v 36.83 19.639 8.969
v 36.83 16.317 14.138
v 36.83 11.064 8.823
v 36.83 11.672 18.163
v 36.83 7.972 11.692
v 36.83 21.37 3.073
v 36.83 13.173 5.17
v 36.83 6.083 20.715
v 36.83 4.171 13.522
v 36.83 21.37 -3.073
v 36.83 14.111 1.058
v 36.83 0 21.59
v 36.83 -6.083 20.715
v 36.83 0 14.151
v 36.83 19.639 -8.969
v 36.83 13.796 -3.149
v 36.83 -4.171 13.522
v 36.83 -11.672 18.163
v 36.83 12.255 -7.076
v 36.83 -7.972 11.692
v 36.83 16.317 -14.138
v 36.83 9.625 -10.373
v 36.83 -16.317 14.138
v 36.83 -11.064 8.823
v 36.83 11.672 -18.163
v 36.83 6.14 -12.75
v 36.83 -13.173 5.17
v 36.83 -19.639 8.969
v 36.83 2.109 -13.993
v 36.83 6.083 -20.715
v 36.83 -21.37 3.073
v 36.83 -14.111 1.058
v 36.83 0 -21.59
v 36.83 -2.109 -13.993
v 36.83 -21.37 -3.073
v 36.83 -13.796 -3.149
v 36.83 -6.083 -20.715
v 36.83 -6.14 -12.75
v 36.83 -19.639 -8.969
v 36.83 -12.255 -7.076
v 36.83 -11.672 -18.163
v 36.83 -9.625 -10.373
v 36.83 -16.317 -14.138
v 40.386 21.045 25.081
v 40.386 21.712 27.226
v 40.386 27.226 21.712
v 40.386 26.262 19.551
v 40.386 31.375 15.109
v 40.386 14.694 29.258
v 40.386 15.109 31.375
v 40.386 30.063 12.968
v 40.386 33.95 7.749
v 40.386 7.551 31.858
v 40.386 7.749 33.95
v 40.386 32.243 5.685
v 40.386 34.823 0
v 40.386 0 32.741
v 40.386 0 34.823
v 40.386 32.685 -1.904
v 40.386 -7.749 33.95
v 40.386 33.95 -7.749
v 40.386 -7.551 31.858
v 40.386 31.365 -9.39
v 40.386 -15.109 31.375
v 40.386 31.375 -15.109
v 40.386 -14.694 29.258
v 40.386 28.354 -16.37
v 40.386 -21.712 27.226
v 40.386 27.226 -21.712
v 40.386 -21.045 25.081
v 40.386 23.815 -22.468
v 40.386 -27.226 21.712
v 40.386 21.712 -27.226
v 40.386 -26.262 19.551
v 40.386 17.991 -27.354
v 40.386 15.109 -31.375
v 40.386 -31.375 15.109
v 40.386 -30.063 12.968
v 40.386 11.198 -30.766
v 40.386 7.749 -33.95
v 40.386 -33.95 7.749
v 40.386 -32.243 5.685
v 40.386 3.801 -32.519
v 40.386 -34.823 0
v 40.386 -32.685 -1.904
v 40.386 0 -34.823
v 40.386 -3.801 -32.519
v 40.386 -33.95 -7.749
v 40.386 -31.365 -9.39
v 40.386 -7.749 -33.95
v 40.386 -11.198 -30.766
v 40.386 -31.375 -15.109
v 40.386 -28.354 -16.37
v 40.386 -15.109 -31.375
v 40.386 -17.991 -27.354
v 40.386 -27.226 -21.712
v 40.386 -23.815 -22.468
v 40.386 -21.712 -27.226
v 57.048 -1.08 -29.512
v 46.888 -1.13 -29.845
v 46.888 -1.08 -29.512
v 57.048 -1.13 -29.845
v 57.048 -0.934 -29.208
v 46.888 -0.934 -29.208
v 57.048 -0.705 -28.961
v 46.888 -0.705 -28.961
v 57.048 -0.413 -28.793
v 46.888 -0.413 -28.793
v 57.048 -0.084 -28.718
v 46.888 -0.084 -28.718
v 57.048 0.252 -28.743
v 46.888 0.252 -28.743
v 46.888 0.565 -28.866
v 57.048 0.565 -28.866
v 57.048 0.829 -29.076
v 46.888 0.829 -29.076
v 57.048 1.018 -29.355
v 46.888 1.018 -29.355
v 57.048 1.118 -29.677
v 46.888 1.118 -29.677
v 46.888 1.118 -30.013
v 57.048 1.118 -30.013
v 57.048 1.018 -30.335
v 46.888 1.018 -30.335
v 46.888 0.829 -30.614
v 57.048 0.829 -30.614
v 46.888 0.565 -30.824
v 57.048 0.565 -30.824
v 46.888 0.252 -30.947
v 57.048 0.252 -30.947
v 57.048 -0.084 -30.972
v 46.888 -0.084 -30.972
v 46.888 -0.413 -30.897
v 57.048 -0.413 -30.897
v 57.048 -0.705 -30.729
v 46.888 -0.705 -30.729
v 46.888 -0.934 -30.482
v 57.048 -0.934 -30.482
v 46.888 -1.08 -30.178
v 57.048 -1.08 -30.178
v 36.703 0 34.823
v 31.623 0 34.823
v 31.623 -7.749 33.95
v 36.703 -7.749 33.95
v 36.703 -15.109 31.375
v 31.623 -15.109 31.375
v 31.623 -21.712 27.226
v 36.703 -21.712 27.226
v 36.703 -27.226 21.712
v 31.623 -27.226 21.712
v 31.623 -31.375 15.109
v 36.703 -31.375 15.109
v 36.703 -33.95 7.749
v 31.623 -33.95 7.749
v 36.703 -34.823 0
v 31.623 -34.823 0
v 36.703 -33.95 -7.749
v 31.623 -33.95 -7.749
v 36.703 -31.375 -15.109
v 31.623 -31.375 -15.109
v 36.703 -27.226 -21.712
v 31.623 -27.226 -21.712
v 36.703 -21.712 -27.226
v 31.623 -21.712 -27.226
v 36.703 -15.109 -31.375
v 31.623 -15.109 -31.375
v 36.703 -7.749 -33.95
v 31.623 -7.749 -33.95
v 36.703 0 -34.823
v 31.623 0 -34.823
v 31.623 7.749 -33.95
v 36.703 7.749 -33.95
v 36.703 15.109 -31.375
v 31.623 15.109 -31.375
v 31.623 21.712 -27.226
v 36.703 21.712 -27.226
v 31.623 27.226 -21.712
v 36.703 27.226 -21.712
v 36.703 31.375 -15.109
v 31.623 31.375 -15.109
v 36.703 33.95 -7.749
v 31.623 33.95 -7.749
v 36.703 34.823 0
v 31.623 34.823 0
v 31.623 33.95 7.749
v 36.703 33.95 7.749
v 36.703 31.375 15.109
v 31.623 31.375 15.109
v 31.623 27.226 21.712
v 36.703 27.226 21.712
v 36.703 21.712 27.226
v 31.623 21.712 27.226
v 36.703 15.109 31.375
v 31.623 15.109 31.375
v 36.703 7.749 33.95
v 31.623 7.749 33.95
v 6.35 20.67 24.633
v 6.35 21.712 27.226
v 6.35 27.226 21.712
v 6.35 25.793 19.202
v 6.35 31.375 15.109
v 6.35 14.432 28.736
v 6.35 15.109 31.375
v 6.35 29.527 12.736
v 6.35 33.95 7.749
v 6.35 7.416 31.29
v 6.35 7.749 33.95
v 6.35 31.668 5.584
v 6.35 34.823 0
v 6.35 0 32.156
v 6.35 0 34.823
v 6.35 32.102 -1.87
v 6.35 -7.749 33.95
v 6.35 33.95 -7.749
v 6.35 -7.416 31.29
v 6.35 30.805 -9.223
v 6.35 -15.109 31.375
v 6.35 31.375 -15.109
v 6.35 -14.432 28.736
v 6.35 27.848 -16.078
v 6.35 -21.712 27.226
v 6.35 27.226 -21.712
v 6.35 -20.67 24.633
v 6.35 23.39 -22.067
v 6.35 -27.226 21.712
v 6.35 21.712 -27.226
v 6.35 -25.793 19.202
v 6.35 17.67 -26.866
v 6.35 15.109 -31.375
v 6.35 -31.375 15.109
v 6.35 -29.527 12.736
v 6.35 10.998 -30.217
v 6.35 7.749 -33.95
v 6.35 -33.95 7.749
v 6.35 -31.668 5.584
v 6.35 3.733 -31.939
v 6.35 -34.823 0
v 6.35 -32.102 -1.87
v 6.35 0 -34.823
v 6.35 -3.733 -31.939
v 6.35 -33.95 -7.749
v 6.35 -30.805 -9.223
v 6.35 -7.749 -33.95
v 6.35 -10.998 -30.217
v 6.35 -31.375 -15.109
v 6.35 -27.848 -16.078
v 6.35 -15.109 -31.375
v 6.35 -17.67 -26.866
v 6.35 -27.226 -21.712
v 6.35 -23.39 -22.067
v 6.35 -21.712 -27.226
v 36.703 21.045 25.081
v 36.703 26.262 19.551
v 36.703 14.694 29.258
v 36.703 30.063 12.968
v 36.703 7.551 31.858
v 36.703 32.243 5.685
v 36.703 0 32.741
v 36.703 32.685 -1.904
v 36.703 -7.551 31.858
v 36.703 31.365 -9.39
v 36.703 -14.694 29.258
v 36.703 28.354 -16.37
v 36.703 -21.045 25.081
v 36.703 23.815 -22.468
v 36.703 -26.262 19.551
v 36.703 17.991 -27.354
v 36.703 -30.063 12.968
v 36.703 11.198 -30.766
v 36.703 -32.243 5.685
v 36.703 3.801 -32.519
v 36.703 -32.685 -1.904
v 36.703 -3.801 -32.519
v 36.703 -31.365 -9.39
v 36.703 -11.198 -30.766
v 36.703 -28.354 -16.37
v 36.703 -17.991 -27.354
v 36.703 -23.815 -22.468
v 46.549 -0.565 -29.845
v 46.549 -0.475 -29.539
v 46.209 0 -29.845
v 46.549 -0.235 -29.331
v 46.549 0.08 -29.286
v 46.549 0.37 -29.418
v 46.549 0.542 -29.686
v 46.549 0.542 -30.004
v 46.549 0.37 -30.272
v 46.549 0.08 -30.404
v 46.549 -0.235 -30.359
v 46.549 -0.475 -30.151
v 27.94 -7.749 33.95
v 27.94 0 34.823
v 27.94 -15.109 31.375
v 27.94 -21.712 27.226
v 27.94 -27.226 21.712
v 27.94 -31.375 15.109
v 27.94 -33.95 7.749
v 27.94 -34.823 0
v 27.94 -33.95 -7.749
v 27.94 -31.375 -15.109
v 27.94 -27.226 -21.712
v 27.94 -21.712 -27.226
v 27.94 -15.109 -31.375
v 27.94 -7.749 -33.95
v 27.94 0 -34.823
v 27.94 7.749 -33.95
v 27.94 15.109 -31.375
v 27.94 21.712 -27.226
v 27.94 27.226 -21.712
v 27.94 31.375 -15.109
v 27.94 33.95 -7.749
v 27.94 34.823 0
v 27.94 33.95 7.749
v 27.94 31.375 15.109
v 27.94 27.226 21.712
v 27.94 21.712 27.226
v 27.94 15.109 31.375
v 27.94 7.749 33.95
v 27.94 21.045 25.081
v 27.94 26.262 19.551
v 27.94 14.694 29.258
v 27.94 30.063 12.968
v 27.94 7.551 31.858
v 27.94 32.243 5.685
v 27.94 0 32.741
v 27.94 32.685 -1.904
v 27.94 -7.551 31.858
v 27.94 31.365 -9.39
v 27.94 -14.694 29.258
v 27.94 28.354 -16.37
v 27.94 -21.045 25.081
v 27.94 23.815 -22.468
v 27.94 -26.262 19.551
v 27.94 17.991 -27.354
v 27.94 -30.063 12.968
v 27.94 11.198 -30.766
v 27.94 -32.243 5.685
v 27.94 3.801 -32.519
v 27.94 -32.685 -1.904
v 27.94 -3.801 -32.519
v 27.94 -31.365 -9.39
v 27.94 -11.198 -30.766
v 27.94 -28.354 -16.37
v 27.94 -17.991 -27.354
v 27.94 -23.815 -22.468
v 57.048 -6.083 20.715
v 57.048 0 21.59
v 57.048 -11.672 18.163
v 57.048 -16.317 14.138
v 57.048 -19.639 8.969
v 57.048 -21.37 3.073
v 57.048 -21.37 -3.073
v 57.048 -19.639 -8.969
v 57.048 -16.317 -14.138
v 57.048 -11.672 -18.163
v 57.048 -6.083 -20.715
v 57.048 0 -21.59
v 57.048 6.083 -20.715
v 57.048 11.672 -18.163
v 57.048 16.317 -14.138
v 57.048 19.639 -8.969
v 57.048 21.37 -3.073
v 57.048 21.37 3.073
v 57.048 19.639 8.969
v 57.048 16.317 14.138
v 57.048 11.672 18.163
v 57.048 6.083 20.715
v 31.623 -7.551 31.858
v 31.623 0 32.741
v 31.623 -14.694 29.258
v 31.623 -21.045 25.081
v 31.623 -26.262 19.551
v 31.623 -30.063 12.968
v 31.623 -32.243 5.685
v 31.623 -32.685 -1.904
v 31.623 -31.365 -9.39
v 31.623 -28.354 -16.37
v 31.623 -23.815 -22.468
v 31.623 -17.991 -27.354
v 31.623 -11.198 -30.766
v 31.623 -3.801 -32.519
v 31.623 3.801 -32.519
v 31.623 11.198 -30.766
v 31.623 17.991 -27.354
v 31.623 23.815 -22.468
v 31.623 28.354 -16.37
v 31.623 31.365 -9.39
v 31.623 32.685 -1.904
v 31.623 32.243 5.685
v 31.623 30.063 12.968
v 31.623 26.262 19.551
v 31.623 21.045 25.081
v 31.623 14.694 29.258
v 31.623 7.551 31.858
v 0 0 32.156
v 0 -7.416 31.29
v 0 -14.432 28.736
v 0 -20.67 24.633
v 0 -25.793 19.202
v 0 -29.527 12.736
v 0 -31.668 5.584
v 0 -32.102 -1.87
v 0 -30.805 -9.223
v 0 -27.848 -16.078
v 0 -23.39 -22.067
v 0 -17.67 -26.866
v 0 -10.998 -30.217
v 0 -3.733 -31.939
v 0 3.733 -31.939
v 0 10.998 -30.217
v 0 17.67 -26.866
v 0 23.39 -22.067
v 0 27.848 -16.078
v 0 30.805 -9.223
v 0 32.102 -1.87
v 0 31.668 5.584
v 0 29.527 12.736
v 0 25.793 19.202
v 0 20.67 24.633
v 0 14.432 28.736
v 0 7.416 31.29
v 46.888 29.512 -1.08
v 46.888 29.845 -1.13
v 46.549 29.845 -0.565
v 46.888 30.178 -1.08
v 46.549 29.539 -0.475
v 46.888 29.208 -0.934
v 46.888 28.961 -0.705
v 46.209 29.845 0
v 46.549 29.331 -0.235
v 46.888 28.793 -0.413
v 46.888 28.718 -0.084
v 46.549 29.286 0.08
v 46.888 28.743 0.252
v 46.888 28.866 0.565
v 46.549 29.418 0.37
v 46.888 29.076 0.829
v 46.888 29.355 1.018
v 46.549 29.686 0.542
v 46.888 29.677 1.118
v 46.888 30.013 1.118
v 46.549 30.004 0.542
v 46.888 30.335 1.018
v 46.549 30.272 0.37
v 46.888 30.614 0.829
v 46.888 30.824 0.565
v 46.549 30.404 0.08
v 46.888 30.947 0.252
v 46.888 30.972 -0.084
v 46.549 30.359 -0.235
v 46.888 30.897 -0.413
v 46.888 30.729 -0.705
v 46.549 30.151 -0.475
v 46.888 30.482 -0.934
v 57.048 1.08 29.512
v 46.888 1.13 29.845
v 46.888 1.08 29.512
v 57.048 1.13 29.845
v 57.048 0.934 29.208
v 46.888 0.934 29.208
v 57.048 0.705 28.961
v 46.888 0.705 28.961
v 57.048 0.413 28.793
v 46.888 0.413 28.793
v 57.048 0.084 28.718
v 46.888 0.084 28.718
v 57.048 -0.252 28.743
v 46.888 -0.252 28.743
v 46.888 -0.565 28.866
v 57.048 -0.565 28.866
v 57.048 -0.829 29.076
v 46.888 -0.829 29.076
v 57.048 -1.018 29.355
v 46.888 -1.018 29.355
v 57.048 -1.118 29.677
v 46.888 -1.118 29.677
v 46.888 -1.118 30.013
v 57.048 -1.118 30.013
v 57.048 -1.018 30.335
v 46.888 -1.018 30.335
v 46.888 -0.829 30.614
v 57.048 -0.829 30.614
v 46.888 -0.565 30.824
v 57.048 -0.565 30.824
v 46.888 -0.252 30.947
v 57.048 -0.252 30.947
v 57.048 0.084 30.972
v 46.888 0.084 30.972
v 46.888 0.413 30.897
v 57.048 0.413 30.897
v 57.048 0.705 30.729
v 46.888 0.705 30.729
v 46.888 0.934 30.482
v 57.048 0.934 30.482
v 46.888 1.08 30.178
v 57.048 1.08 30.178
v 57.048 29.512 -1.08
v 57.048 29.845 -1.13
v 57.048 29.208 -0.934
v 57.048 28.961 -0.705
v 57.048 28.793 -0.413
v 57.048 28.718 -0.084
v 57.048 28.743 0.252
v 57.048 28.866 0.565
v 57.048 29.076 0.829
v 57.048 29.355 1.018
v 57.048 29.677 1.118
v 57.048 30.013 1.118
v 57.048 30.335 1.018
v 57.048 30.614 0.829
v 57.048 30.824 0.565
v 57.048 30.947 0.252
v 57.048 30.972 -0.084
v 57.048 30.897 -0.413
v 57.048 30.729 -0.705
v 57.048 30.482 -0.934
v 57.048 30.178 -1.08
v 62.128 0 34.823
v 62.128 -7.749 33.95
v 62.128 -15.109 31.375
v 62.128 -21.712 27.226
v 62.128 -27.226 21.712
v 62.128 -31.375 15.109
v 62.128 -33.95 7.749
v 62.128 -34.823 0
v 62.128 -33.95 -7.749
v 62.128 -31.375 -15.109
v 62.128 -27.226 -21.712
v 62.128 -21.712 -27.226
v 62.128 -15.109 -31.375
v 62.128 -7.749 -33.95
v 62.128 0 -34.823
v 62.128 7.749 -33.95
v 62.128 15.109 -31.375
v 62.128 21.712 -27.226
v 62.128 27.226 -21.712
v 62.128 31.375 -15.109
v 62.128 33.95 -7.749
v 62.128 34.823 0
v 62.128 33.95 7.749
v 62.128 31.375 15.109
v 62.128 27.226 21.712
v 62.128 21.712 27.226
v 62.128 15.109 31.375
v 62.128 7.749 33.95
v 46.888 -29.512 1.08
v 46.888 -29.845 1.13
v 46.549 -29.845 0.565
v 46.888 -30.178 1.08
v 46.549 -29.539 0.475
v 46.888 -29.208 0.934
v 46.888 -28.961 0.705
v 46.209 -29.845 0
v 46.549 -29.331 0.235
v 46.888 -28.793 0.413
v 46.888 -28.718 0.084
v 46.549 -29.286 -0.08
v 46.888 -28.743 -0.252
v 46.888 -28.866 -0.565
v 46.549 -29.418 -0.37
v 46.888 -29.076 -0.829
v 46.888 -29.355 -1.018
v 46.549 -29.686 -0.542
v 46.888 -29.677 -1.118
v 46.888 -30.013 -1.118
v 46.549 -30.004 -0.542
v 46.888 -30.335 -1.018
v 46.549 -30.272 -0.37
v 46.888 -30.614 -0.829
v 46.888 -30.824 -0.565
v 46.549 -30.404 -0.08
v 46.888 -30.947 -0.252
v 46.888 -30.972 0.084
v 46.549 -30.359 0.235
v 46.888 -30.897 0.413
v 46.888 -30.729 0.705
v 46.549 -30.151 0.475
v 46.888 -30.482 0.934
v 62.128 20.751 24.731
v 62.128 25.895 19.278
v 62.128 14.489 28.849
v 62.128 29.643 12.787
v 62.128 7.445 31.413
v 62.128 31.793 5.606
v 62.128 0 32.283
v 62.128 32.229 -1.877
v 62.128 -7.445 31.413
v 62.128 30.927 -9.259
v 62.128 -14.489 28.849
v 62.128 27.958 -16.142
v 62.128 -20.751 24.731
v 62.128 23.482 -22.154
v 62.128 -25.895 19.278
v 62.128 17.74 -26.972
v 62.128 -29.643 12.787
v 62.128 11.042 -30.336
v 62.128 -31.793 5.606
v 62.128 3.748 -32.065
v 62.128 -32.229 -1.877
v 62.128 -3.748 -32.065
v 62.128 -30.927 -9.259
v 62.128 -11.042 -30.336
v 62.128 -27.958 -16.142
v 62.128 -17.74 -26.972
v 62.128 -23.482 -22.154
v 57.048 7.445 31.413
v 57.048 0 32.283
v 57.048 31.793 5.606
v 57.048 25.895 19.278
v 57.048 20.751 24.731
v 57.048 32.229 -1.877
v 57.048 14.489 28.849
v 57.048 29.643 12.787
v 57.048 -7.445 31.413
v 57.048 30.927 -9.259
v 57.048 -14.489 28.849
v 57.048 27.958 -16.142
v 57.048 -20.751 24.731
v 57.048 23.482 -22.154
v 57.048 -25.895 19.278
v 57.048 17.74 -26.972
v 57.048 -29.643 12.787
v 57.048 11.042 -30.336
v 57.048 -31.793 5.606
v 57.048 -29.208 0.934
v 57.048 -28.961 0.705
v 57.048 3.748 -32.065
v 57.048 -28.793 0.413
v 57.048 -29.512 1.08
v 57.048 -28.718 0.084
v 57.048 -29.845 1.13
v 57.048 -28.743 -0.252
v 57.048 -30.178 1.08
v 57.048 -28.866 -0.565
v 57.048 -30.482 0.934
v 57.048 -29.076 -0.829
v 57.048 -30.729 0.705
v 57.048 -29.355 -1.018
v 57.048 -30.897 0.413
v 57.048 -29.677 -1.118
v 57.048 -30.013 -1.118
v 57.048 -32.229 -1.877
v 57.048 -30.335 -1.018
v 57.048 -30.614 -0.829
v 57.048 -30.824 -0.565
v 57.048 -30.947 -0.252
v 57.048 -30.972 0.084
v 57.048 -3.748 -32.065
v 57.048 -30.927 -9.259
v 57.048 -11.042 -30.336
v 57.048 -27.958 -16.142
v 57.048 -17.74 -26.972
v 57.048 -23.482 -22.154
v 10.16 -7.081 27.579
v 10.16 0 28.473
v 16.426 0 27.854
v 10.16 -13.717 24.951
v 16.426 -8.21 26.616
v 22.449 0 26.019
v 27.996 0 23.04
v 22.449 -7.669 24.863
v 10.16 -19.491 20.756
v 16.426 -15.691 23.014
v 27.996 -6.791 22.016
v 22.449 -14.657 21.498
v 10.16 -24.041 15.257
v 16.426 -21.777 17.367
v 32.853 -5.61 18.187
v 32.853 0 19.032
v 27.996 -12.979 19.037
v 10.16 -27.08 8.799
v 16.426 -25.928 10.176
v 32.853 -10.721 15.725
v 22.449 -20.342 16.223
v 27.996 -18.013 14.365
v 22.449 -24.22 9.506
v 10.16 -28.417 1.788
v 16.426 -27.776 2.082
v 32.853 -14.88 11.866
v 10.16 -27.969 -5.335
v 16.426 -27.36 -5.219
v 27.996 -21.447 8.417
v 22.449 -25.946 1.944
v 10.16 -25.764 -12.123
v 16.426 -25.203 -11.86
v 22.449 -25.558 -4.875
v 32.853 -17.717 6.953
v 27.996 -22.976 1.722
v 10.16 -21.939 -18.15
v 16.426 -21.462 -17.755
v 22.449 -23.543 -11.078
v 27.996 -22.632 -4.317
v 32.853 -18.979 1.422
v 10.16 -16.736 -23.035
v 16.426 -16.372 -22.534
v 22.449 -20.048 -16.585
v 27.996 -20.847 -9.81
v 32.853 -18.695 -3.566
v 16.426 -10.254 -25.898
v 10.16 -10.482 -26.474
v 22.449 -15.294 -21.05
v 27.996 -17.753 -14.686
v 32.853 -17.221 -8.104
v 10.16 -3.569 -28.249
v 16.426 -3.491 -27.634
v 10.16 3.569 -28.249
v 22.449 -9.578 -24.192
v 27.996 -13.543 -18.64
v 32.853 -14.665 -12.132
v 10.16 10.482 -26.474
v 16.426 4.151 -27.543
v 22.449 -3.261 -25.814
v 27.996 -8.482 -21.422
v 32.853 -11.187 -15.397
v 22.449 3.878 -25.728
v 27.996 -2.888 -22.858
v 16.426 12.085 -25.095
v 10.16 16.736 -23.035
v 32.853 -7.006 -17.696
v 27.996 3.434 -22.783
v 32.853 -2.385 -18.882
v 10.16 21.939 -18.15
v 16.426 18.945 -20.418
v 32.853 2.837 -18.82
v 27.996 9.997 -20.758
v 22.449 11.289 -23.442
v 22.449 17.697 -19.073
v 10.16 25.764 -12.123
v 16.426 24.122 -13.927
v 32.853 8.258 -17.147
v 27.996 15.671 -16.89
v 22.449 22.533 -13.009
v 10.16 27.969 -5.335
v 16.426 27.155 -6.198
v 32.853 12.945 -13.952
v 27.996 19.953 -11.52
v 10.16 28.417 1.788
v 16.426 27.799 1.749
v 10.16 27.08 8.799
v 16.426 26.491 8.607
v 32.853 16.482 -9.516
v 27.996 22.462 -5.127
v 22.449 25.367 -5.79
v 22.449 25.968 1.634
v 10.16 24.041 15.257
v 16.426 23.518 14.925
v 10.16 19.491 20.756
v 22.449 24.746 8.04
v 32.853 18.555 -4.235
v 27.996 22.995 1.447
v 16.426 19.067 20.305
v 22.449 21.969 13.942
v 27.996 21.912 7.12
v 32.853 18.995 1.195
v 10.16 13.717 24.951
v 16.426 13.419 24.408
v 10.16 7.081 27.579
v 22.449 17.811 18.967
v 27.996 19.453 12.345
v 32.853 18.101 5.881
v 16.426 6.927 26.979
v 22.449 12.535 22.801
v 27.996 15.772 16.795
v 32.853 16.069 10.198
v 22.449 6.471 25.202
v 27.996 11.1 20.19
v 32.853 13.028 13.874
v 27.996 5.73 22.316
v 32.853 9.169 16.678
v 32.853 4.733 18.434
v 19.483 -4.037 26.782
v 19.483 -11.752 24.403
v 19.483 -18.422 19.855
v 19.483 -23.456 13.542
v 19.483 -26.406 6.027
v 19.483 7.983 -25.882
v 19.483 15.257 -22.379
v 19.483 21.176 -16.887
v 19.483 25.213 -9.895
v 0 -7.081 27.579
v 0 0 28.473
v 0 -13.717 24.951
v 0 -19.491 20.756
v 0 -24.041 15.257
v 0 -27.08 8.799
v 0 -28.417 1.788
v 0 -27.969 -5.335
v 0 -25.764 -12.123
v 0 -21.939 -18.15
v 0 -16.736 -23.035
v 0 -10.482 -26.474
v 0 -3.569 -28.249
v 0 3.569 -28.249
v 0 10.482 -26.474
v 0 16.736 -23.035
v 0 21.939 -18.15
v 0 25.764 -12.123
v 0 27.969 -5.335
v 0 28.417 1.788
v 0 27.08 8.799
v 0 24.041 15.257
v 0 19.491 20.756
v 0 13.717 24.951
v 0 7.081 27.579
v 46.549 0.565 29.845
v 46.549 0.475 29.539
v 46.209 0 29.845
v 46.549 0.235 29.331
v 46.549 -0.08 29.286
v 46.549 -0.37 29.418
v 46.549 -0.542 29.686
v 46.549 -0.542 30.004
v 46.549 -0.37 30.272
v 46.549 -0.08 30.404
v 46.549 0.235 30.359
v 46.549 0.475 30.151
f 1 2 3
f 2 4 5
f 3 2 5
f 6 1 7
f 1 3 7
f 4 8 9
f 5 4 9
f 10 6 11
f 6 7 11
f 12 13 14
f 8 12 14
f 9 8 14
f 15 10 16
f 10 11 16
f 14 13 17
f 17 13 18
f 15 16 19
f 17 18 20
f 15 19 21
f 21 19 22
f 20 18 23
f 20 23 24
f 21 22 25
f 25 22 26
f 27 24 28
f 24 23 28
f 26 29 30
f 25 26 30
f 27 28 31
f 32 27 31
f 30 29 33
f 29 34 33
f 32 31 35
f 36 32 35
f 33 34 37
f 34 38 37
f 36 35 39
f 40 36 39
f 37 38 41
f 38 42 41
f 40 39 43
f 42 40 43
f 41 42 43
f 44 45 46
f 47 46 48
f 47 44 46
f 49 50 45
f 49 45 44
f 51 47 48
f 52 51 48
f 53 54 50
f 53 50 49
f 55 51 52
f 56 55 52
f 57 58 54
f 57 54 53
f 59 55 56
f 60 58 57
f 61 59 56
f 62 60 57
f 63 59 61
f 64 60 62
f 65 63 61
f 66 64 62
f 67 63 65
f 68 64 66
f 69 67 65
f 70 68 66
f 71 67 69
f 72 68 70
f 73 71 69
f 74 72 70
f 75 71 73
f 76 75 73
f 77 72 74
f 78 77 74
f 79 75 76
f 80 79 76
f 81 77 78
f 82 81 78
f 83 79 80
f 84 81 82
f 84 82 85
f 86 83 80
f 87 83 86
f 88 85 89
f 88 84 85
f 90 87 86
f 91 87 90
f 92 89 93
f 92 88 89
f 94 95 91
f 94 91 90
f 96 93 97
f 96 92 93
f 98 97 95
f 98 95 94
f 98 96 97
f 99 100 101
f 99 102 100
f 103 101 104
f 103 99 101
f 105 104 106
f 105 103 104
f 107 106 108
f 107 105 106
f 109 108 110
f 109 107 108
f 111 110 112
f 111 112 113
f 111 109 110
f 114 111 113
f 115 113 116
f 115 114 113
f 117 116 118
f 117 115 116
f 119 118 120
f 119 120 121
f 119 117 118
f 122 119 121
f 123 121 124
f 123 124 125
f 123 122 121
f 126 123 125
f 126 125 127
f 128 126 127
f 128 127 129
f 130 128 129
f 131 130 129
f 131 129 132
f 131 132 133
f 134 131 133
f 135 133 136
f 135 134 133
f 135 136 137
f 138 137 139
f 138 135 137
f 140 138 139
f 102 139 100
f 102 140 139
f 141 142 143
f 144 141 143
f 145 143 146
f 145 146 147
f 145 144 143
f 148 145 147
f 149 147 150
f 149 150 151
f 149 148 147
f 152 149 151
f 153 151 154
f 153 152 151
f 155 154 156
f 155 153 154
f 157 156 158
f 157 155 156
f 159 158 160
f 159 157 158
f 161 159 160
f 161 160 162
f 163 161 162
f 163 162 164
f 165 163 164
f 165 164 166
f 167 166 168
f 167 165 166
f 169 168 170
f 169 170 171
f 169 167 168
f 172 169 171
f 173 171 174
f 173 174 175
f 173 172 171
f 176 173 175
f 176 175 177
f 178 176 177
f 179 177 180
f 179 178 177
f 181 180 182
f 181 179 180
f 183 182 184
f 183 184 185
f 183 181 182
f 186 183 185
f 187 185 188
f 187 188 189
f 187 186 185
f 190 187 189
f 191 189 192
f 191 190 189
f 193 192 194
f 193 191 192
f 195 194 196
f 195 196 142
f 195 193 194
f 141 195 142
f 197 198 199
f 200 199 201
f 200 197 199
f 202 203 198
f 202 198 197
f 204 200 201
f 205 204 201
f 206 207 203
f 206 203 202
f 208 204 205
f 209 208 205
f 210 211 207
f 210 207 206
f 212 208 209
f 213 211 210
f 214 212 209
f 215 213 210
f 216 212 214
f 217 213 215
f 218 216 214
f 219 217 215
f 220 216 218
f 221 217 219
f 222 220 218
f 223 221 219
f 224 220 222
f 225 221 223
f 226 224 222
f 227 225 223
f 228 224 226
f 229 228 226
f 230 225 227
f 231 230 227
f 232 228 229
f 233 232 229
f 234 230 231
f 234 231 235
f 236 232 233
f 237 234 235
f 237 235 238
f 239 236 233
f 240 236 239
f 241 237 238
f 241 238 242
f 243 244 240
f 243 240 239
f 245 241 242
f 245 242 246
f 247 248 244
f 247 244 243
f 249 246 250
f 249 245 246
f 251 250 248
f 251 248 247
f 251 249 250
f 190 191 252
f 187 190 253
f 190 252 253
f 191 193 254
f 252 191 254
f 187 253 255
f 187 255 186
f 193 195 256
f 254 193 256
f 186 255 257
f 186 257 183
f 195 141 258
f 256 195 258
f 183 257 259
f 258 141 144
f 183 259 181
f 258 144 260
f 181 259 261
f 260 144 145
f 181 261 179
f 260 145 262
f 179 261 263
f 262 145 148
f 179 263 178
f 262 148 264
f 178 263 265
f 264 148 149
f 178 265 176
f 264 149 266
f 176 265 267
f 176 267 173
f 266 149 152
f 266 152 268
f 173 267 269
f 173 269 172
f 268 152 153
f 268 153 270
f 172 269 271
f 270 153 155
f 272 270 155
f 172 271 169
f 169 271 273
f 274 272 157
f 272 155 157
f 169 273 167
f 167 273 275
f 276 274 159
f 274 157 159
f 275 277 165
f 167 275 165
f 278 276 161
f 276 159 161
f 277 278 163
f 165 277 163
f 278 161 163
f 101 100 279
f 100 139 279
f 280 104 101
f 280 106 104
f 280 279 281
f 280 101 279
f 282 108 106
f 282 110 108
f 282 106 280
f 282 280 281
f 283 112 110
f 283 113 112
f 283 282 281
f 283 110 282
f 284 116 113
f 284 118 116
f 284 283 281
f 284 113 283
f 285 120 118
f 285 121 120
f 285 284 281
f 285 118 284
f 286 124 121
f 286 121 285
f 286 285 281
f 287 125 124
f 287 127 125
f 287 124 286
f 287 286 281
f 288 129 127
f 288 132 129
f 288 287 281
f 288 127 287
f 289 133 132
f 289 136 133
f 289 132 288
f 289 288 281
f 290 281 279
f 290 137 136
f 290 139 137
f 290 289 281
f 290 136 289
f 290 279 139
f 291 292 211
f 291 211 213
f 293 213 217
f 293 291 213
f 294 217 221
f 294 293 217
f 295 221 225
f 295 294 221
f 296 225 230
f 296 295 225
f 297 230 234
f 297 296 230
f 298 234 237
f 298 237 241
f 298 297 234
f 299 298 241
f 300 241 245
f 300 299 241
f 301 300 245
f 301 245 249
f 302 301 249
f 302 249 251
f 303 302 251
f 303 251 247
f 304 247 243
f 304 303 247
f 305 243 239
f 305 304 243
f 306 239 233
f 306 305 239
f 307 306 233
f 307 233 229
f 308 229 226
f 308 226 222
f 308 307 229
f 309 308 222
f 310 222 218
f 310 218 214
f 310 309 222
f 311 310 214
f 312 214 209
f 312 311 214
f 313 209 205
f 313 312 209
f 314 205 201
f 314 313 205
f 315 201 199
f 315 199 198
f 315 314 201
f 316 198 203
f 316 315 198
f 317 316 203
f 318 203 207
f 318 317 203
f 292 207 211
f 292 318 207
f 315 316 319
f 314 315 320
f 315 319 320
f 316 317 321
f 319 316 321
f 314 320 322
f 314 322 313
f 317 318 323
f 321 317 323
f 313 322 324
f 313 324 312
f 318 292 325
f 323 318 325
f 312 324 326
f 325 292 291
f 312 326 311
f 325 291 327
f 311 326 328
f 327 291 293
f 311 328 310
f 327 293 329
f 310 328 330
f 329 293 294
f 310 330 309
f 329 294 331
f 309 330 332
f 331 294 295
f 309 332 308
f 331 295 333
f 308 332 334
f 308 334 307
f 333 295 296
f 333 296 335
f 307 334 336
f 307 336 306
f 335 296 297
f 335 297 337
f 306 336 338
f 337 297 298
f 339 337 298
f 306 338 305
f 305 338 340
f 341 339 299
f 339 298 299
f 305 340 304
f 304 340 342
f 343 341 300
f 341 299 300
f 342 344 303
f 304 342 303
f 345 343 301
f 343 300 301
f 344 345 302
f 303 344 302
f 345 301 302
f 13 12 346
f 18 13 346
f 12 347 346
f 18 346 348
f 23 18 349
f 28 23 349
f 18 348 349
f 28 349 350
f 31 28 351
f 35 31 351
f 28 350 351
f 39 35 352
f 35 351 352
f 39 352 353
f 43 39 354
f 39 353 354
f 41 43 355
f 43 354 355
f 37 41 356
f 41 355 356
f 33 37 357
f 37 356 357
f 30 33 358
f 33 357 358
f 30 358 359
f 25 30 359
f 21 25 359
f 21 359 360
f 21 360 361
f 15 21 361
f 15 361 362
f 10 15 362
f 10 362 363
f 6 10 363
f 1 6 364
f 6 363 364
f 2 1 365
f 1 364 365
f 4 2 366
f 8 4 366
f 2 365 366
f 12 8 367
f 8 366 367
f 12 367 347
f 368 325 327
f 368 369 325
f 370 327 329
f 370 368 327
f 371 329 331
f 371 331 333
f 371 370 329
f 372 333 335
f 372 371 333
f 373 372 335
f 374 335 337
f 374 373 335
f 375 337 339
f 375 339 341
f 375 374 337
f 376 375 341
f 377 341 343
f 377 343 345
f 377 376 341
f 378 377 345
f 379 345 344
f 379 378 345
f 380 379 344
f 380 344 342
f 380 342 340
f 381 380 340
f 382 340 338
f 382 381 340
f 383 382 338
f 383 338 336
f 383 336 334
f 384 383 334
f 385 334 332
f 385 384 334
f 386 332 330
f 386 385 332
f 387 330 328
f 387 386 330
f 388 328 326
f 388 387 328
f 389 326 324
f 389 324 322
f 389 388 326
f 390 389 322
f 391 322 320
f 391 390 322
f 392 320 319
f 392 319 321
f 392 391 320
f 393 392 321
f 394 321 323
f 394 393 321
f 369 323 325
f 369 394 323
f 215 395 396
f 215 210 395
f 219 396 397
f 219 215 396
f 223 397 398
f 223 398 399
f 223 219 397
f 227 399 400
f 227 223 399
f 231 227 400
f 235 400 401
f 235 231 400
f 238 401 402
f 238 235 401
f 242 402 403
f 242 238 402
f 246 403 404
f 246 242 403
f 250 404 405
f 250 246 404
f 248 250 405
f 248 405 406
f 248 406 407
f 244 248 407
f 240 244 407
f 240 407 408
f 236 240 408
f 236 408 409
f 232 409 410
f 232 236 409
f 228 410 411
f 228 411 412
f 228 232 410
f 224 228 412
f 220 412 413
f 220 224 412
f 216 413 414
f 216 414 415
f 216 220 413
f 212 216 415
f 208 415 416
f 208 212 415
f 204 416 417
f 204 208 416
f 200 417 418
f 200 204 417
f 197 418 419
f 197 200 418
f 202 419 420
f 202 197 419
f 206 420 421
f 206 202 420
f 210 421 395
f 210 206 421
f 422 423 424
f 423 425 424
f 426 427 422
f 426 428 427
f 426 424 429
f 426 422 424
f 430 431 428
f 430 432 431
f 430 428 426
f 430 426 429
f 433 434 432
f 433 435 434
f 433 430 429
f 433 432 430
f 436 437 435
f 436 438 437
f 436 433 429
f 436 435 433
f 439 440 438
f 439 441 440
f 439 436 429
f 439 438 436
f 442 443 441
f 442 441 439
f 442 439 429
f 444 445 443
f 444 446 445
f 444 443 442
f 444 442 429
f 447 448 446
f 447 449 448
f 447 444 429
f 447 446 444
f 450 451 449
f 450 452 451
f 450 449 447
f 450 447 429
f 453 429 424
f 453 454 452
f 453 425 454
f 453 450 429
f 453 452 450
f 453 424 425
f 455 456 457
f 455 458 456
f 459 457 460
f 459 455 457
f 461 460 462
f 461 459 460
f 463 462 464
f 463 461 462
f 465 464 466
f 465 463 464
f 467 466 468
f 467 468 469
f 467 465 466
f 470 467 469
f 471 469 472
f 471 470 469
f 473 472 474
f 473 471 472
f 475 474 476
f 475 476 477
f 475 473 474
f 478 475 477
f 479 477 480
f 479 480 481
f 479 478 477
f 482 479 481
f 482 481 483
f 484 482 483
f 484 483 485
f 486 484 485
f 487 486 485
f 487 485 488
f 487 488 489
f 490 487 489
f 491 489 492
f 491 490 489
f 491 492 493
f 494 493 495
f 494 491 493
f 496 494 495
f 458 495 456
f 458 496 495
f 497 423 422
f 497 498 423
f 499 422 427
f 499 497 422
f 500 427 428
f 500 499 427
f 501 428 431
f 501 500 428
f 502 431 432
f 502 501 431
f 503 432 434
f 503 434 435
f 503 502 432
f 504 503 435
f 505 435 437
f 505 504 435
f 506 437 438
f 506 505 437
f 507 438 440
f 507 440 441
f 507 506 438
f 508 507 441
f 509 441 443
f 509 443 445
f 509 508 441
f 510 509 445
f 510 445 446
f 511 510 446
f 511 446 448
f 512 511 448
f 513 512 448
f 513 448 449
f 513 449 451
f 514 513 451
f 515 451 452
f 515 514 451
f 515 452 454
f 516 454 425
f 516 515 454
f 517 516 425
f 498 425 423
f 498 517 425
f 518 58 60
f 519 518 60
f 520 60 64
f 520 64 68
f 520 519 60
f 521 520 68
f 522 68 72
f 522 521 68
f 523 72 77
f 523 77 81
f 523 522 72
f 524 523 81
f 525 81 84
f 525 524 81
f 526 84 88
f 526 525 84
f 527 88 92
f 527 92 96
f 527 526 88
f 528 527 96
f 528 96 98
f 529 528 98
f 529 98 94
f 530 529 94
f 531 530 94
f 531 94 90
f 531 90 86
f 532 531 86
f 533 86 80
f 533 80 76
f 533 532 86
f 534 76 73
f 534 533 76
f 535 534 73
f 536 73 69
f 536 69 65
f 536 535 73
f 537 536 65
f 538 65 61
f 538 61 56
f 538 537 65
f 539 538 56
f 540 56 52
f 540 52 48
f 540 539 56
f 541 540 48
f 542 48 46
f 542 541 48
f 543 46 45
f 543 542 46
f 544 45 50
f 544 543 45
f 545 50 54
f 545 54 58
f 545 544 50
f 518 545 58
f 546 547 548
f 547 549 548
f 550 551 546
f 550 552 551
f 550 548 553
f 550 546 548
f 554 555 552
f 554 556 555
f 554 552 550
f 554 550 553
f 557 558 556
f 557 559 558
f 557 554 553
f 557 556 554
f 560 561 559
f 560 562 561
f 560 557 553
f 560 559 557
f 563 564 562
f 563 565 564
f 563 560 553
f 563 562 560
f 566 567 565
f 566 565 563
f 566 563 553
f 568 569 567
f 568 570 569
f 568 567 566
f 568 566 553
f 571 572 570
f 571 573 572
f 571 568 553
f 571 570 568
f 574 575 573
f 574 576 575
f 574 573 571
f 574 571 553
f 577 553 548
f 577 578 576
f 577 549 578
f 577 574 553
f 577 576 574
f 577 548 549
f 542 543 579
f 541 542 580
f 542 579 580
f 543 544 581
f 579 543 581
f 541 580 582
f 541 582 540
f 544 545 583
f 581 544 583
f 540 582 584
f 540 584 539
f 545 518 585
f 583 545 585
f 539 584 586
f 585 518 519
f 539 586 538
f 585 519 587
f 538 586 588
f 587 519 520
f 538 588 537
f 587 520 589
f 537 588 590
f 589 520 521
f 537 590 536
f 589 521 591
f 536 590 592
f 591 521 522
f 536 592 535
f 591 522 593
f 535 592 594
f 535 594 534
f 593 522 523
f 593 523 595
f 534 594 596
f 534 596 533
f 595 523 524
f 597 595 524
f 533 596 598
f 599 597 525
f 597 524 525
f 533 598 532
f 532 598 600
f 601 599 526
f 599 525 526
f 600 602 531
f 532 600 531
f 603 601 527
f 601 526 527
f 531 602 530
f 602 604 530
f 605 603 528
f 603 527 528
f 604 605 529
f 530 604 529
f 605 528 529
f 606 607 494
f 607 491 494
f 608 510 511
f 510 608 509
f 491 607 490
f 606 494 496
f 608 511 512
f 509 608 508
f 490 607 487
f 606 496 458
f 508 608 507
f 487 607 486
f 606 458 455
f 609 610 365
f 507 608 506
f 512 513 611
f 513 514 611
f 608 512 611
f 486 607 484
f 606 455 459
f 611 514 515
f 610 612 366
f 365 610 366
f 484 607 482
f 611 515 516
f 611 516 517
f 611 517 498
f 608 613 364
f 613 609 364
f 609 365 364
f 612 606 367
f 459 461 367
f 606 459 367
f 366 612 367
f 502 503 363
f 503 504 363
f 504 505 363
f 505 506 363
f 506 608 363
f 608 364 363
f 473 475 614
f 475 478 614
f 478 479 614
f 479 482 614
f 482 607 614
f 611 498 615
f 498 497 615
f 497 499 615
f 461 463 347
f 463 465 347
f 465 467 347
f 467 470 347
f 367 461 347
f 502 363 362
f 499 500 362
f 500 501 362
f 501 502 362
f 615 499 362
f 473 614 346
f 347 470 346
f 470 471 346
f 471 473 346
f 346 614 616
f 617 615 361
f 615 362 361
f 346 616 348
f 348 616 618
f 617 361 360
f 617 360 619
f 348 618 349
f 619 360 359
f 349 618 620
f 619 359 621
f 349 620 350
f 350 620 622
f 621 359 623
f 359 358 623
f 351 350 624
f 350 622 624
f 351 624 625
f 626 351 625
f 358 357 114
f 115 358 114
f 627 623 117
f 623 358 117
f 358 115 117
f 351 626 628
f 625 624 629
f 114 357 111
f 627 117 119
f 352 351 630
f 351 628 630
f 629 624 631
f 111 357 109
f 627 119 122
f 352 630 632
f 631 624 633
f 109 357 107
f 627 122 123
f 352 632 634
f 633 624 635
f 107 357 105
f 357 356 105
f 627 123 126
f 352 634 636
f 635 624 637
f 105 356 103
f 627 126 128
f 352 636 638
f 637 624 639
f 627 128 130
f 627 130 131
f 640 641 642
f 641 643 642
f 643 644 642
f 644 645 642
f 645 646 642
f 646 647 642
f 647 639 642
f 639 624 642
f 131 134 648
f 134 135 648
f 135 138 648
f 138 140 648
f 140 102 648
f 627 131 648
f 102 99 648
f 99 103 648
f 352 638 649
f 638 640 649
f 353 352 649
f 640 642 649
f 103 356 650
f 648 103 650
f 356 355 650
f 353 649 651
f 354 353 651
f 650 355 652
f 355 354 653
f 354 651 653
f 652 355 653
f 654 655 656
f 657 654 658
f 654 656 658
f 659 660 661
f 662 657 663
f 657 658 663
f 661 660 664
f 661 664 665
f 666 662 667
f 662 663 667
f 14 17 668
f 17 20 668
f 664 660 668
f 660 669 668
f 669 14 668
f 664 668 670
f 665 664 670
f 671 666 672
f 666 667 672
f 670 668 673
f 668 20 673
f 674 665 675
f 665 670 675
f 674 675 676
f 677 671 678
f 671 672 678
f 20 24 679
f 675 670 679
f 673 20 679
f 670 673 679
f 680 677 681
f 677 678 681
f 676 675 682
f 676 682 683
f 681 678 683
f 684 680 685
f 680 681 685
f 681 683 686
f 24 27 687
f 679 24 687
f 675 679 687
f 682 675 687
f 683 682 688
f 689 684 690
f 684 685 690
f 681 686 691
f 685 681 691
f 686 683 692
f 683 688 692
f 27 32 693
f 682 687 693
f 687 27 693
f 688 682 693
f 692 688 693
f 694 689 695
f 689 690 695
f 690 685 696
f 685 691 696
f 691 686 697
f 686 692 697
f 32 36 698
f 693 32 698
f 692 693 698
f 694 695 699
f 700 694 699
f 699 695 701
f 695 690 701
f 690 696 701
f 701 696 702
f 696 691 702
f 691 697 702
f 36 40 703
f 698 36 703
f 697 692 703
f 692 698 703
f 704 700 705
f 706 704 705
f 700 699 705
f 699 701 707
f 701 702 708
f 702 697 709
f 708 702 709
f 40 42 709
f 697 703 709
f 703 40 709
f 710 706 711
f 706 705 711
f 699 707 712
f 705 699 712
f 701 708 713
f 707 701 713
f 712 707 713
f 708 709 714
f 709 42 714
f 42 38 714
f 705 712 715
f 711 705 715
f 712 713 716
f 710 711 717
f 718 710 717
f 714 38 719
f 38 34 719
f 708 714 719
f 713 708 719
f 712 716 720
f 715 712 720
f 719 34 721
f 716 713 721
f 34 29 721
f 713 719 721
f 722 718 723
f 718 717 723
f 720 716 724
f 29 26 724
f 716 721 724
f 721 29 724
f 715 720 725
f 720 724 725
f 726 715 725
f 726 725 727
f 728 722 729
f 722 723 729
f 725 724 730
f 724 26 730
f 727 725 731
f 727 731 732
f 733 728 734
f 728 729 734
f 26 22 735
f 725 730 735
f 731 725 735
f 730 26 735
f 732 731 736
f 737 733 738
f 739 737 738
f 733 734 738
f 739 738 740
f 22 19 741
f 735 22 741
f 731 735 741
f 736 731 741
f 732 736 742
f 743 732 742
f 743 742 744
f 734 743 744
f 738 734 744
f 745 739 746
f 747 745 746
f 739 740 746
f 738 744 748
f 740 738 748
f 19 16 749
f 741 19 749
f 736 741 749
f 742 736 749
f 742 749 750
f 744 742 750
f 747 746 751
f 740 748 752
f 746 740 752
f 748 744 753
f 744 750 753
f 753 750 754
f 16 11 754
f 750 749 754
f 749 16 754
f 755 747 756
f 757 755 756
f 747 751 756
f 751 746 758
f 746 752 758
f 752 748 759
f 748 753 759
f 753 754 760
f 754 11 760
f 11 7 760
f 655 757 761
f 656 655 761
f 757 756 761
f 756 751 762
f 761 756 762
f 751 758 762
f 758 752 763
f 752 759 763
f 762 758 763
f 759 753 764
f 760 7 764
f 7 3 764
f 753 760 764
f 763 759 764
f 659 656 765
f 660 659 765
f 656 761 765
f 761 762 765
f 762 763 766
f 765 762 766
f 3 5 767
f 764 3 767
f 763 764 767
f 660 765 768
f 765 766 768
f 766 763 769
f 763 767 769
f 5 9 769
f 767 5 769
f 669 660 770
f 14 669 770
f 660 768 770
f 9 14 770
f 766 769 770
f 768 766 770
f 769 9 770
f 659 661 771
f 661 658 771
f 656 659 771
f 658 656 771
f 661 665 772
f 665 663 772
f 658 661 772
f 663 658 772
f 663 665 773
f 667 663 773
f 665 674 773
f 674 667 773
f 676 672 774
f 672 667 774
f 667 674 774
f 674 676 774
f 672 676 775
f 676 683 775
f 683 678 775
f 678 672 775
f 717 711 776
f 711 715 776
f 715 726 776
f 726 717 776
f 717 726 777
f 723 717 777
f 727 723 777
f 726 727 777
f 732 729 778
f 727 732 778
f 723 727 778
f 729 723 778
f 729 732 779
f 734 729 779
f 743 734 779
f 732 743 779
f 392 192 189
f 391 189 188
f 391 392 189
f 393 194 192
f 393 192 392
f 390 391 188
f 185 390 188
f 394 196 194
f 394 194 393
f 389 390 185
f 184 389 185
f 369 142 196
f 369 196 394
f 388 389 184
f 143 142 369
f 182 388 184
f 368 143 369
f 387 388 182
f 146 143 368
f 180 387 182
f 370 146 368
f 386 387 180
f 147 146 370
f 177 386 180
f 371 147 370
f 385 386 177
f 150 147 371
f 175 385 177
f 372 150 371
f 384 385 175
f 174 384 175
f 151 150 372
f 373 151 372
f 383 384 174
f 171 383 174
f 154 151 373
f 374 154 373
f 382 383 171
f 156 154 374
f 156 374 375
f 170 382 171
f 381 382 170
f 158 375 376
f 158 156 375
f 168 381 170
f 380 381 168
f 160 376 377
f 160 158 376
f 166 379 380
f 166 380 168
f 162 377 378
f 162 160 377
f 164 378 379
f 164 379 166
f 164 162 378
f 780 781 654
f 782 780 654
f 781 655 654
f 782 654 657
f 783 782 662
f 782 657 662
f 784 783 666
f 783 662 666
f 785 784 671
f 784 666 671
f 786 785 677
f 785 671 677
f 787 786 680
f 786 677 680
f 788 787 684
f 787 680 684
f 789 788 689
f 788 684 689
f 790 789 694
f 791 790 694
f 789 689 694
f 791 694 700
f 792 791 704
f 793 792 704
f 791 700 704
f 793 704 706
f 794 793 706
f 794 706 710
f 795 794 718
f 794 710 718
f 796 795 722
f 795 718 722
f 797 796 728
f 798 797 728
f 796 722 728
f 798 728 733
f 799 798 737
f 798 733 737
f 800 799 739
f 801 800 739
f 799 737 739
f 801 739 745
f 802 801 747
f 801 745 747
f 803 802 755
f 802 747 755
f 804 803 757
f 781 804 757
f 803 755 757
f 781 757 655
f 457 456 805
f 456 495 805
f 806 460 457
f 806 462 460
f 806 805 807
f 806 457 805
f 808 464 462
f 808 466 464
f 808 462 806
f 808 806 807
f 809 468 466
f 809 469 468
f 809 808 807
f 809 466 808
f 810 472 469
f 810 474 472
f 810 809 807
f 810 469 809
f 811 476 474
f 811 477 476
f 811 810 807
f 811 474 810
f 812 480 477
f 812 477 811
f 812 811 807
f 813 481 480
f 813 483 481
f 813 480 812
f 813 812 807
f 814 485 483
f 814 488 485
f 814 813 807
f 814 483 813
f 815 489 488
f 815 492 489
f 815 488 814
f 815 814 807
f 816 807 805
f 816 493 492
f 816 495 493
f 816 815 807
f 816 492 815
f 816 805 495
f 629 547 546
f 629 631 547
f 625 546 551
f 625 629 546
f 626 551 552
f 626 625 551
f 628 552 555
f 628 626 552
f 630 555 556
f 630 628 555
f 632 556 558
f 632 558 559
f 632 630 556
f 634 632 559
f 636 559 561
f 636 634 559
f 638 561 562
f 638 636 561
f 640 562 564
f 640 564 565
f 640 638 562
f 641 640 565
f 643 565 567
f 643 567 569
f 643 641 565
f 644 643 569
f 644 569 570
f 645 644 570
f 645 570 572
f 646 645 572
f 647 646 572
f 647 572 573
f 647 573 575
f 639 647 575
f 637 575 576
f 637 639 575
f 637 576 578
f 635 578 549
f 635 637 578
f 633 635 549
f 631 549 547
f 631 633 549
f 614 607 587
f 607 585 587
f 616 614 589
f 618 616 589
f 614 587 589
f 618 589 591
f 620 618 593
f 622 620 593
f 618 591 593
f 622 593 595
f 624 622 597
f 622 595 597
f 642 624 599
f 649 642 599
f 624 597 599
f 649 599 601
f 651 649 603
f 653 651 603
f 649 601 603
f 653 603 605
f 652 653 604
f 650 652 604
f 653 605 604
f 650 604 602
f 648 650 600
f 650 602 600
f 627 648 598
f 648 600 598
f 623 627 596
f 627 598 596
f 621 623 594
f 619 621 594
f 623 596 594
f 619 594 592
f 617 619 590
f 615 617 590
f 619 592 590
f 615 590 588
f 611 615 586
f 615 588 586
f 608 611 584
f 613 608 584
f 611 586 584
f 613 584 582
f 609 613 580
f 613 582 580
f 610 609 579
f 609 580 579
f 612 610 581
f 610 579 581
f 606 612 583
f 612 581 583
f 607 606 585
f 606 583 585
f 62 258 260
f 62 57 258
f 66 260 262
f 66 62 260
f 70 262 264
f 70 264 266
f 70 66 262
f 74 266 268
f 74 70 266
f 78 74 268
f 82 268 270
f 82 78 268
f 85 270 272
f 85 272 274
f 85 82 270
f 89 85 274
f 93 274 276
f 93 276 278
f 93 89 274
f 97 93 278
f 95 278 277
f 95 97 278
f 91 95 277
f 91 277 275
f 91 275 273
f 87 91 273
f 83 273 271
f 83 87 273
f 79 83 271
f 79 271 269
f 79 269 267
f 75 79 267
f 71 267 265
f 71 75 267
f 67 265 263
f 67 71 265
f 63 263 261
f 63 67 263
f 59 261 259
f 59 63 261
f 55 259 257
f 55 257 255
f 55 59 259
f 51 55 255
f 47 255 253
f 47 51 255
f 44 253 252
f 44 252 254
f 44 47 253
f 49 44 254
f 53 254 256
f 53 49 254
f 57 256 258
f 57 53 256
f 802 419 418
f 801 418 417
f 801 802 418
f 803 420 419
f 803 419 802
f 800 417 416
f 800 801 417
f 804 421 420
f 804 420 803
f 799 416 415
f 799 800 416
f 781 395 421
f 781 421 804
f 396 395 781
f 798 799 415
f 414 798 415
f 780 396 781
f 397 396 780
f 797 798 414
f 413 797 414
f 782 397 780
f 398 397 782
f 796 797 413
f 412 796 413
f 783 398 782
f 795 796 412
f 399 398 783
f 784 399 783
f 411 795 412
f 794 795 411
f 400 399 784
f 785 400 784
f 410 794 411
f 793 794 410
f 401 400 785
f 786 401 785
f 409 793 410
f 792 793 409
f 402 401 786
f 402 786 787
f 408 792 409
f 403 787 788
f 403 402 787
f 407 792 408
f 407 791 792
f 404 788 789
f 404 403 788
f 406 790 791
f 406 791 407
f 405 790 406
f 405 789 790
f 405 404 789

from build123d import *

# Parameters (mm, degrees)
SKETCH1_W         = 101.6
SKETCH1_H         = 34.8234
SKETCH3_W         = 6.35
SKETCH3_H         = 2.667
SKETCH4_W         = 38.1
SKETCH4_H         = 9.017
CIRPATTERN1_COUNT = 4
SKETCH8_W         = 3.683
SKETCH8_H         = 2.0828


with BuildPart() as part:
    # Sketch1 → Revolve1 (revolve)
    with BuildSketch(Plane.XY, mode=Mode.PRIVATE) as revolve1_sk:
        with Locations((50.8, 17.4117)):
            Rectangle(SKETCH1_W, SKETCH1_H)
    revolve(revolve1_sk.sketch.rotate(Axis((-14.406993702, 0, 0), (1, 0, 0)), 90), axis=Axis((-14.406993702, 0, 0), (1, 0, 0)))

    # Sketch2 → Cut-Revolve1 (revolve, cut)
    with BuildSketch(Plane.XY, mode=Mode.PRIVATE) as cut_revolve1_sk:
        with BuildLine():
            Line((0, 28.4734), (10.16, 28.4734))
            ThreePointArc((10.16, 28.4734), (25.296207294, 24.666285192), (36.83, 14.151033402))
            ThreePointArc((36.83, 14.151033402), (41.000418166, 10.205778874), (46.482, 8.5))
            ThreePointArc((46.482, 8.5), (47.320563586, 8.54516677), (48.120613895, 8.800408672))
            add(Edge.make_bspline(
                [(101.6, 24.9936), (69.441940144, 18.742706384), (48.120613895, 8.800408672)],
                knots=[0, 0, 0, 1, 1, 1], degree=2))
            Line((101.6, 24.9936), (101.6, 0))
            Line((101.6, 0), (0, 0))
            Line((0, 0), (0, 28.4734))
        make_face()
    revolve(cut_revolve1_sk.sketch.rotate(Axis((-14.406993702, 0, 0), (1, 0, 0)), 90), axis=Axis((-14.406993702, 0, 0), (1, 0, 0)), mode=Mode.SUBTRACT)

    # Sketch3 → Cut-Revolve2 (revolve, cut)
    with BuildSketch(Plane.XY, mode=Mode.PRIVATE) as cut_revolve2_sk:
        with Locations((3.175, 33.4899)):
            Rectangle(SKETCH3_W, SKETCH3_H)
    revolve(cut_revolve2_sk.sketch.rotate(Axis((-14.406993702, 0, 0), (1, 0, 0)), 90), axis=Axis((-14.406993702, 0, 0), (1, 0, 0)), mode=Mode.SUBTRACT)

    # Sketch4 → Cut-Revolve3 (revolve, cut)
    with BuildSketch(Plane.XY, mode=Mode.PRIVATE) as cut_revolve3_sk:
        with Locations((82.55, 30.3149)):
            Rectangle(SKETCH4_W, SKETCH4_H)
    revolve(cut_revolve3_sk.sketch.rotate(Axis((-14.406993702, 0, 0), (1, 0, 0)), 90), axis=Axis((-14.406993702, 0, 0), (1, 0, 0)), mode=Mode.SUBTRACT)

    # Sketch5 → Cut-Revolve4 (revolve, cut)
    with BuildSketch(Plane.XY, mode=Mode.PRIVATE) as cut_revolve4_sk:
        Polygon((36.83, 0), (36.83, 21.59), (57.0484, 21.59), (57.0484, 32.2834), (62.1284, 32.2834), (62.1284, 34.8234), (101.599999985, 34.8234), (101.599999985, 0), align=None)
    revolve(cut_revolve4_sk.sketch.rotate(Axis((-14.406993702, 0, 0), (1, 0, 0)), 90), axis=Axis((-14.406993702, 0, 0), (1, 0, 0)), mode=Mode.SUBTRACT)

    # Sketch7 → #4-40 Tapped Hole1 (revolve, cut)
    with BuildSketch(Plane(origin=(57.0484, 29.845, 0), x_dir=(0, 0, -1), z_dir=(0, 1, 0))):
        Polygon((0, 0), (0, 10.839152758), (1.1303, 10.16), (1.1303, 0), align=None)
    f_4_40_tapped_hole1 = revolve(axis=Axis((63.3984, 29.845, 0), (-1, 0, 0)), mode=Mode.SUBTRACT)

    # CirPattern1: #4-40 Tapped Hole1 ×4 about axis
    cirpattern1_axis = Axis((0, 0, 0), (1, 0, 0))
    for i in range(1, CIRPATTERN1_COUNT):
        add(f_4_40_tapped_hole1.rotate(cirpattern1_axis, i * 360 / CIRPATTERN1_COUNT), mode=Mode.SUBTRACT)

    # Sketch8 → Cut-Revolve5 (revolve, cut)
    with BuildSketch(Plane.XY, mode=Mode.PRIVATE) as cut_revolve5_sk:
        with Locations((29.7815, 33.782)):
            Rectangle(SKETCH8_W, SKETCH8_H)
        with Locations((38.5445, 33.782)):
            Rectangle(SKETCH8_W, SKETCH8_H)
    revolve(cut_revolve5_sk.sketch.rotate(Axis((-14.406993702, 0, 0), (1, 0, 0)), 90), axis=Axis((-14.406993702, 0, 0), (1, 0, 0)), mode=Mode.SUBTRACT)


solid = part.part
